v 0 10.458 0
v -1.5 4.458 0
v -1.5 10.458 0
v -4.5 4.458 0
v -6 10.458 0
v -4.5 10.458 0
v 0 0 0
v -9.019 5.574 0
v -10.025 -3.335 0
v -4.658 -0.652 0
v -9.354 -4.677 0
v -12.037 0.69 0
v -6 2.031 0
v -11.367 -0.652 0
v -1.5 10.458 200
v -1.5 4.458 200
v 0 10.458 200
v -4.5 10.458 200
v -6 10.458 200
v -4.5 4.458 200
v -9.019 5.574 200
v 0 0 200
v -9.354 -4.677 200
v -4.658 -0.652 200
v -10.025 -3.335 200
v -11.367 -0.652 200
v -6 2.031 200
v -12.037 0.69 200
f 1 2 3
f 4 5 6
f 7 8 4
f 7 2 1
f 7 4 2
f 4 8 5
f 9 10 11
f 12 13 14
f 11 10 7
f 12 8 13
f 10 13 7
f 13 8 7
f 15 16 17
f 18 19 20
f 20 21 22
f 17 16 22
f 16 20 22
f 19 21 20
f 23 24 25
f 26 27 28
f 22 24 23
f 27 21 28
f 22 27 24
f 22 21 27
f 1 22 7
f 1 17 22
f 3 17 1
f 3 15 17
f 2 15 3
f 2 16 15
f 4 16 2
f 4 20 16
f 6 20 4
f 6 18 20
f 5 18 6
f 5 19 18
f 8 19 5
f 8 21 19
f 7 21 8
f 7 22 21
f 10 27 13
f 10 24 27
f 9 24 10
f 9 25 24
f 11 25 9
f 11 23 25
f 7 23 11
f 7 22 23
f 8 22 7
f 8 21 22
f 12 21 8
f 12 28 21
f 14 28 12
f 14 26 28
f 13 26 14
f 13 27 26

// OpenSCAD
// angle between planes in given polyhedron (dihedral angle)
// d = 70.52877936550931; // tetrahedron (D4)
// d = 90; // cube / hexahedron (D6)
// d = 109.47122063449069; // octahedron (D8)
d = 116.56505117736714; // dodecahedron (D12)
// d = 138.18968510422138; // icosahedron (D20)

d2 = d/2;

// acrylic plate thickness in mm
a = 3;
//a=6.1;

// acrylic plate depth in frame [mm]
ad = 6;
//ad = 8;

// structure thickness in mm
t = 1.5;

// extrusion length (polyhedron edge length) in mm
l = 146;

// LED strip width in mm
w_led = 12;

module rotate_about_pt(z, y, pt) {
    translate(pt) rotate([0, y, z]) translate(-pt) children();
}

module BracePerimeter(hasCutouts=false) {
    //
    // D1: small triangle
    //

    // cathete touching angle d2 (inner edge)
    h1 = ad + t/2;

    // other cathete
    b1 = h1 * tan(d2);

    // hypothenuse
    c1 = h1 / cos(d2);


    //
    // D2: big triangle
    //

    // cathete not touching angle d2
    b2 = 2*t + a + b1;

    // cathete touching angle d2 (outer edge)
    h2 = b2 * (1 / tan(d2));

    // hypothenuse
    c2 = h2 / cos(d2);

    // 
    // C: cutout for acrylic plate
    //

    // distance from origin in x-direction
    cx = b1 + t;

    // normal of the plane along which to mirror
    n = cross([0, 0, 1],  [b2, h2, 0]);


    // crazy computations for cutout that allows for smooth led strip fit
    hc1 = b1 * cos(d2);
    hc0 = hc1 * sin(d2);
    q0 = hc0 * (1 / tan(d2));

    // assert((hc1 * 2) > w_led, "Not enough space for LED strip.");

    rotate(d/2, [0, 0, 1]) translate([0, c2, 0]) rotate(d2 + 180) union () {
        difference() {
            polygon([[0, 0], [b2, 0], [b2, h2]]); // D2
            polygon([[0, 0], [b1, 0], [b1 - q0, hc0]]); // D1
            if (hasCutouts) polygon([[cx, 0], [cx, ad], [cx + a, ad], [cx + a, 0]]); // cutout for acrylic plate
        }

        mirror(n) {
            difference() {
                polygon([[0, 0], [b2, 0], [b2, h2]]); // D2
                polygon([[0, 0], [b1, 0], [b1 -q0, hc0]]); // D1
                if (hasCutouts) polygon([[cx, 0], [cx, ad], [cx + a, ad], [cx + a, 0]]); // cutout for acrylic plate
            }
        }
    }
}

module Brace(length) {
    linear_extrude(length) BracePerimeter(true);
}

module BraceFitting(length) {
    rotate(-120, [1, 0, 0]) translate([0, -10, 0])  linear_extrude(length) BracePerimeter(true);
}

module TBrace(length) {
    x = (2*t+a) / 2; // translate amount to make cutouts overlap
    translate([x, 0, 0]) linear_extrude(length) BracePerimeter(true);
    translate([-x, 0, 0]) mirror([1, 0, 0]) linear_extrude(length) BracePerimeter(true);
}

module _EdgeBrace(x, y, length) {
    difference() {
        cube([x, y, length]);
        translate([t*2, 0, 0]) cube([a, ad, length]);
        
    }
}

module EdgeBrace(length) {
    x_out = a + t*4;
    y_out = ad + t*2;
    
    _EdgeBrace(x_out, y_out, length);
}

module ScrewCutout() {
    translate([2.5, 0, 0]) rotate([90, 0, 90]) cylinder(h=5, d=2, center=true);
}

// orientation = 0: magnets on the back
// orientation = 1: magnets on the side
module EdgeBraceWithMagnets(length, orientation = 0, hinges = 0, magnets = 0) {
    //
    // D1: small triangle
    //

    // cathete touching angle d2 (inner edge)
    h1 = ad + t/2;

    // other cathete
    b1 = h1 * tan(d2);

    // hypothenuse
    c1 = h1 / cos(d2);


    //
    // D2: big triangle
    //

    // cathete not touching angle d2
    b2 = 2*t + a + b1;

    x_out = a + t*4;
    y_out = b2;

    difference() {
        offs = orientation == 0 ? y_out - x_out / 2 : x_out / 2;

        if (orientation == 0) {
            _EdgeBrace(x_out, y_out, length);
        } else {
            translate([y_out, 0, 0]) rotate([0, 0, 90]) _EdgeBrace(x_out, y_out, length);
        }
    
        // magnet cutouts
        magnet_distance_from_edge = length / 4;
        
        if (magnets == 1) {
            translate([0, offs, magnet_distance_from_edge]) rotate([0, 90, 0]) cylinder(h=2, d=6.2);
            translate([0, offs, length - magnet_distance_from_edge]) rotate([0, 90, 0]) cylinder(h=2, d=6.2);
        }

        // hinge cutouts
        w_hinge = 7.3;
        l_hinge = 17.3;
        d_hinge = 1;
        
        if (hinges == 1) {
            translate([0, offs - 2.5, magnet_distance_from_edge / 4])
                cube([d_hinge, w_hinge, l_hinge]);
            translate([0, offs - 2.5, length - (magnet_distance_from_edge / 2) - w_hinge])
                cube([d_hinge, w_hinge, l_hinge]);
            translate([0, offs - 2.5, length / 2 - l_hinge / 2])
                cube([d_hinge, w_hinge, l_hinge]);
        }
    }
}

$fn=100;
// EdgeBraceWithMagnets((300-12) / 2, orientation=1, hinges=0, magnets=1);
Brace(200);
